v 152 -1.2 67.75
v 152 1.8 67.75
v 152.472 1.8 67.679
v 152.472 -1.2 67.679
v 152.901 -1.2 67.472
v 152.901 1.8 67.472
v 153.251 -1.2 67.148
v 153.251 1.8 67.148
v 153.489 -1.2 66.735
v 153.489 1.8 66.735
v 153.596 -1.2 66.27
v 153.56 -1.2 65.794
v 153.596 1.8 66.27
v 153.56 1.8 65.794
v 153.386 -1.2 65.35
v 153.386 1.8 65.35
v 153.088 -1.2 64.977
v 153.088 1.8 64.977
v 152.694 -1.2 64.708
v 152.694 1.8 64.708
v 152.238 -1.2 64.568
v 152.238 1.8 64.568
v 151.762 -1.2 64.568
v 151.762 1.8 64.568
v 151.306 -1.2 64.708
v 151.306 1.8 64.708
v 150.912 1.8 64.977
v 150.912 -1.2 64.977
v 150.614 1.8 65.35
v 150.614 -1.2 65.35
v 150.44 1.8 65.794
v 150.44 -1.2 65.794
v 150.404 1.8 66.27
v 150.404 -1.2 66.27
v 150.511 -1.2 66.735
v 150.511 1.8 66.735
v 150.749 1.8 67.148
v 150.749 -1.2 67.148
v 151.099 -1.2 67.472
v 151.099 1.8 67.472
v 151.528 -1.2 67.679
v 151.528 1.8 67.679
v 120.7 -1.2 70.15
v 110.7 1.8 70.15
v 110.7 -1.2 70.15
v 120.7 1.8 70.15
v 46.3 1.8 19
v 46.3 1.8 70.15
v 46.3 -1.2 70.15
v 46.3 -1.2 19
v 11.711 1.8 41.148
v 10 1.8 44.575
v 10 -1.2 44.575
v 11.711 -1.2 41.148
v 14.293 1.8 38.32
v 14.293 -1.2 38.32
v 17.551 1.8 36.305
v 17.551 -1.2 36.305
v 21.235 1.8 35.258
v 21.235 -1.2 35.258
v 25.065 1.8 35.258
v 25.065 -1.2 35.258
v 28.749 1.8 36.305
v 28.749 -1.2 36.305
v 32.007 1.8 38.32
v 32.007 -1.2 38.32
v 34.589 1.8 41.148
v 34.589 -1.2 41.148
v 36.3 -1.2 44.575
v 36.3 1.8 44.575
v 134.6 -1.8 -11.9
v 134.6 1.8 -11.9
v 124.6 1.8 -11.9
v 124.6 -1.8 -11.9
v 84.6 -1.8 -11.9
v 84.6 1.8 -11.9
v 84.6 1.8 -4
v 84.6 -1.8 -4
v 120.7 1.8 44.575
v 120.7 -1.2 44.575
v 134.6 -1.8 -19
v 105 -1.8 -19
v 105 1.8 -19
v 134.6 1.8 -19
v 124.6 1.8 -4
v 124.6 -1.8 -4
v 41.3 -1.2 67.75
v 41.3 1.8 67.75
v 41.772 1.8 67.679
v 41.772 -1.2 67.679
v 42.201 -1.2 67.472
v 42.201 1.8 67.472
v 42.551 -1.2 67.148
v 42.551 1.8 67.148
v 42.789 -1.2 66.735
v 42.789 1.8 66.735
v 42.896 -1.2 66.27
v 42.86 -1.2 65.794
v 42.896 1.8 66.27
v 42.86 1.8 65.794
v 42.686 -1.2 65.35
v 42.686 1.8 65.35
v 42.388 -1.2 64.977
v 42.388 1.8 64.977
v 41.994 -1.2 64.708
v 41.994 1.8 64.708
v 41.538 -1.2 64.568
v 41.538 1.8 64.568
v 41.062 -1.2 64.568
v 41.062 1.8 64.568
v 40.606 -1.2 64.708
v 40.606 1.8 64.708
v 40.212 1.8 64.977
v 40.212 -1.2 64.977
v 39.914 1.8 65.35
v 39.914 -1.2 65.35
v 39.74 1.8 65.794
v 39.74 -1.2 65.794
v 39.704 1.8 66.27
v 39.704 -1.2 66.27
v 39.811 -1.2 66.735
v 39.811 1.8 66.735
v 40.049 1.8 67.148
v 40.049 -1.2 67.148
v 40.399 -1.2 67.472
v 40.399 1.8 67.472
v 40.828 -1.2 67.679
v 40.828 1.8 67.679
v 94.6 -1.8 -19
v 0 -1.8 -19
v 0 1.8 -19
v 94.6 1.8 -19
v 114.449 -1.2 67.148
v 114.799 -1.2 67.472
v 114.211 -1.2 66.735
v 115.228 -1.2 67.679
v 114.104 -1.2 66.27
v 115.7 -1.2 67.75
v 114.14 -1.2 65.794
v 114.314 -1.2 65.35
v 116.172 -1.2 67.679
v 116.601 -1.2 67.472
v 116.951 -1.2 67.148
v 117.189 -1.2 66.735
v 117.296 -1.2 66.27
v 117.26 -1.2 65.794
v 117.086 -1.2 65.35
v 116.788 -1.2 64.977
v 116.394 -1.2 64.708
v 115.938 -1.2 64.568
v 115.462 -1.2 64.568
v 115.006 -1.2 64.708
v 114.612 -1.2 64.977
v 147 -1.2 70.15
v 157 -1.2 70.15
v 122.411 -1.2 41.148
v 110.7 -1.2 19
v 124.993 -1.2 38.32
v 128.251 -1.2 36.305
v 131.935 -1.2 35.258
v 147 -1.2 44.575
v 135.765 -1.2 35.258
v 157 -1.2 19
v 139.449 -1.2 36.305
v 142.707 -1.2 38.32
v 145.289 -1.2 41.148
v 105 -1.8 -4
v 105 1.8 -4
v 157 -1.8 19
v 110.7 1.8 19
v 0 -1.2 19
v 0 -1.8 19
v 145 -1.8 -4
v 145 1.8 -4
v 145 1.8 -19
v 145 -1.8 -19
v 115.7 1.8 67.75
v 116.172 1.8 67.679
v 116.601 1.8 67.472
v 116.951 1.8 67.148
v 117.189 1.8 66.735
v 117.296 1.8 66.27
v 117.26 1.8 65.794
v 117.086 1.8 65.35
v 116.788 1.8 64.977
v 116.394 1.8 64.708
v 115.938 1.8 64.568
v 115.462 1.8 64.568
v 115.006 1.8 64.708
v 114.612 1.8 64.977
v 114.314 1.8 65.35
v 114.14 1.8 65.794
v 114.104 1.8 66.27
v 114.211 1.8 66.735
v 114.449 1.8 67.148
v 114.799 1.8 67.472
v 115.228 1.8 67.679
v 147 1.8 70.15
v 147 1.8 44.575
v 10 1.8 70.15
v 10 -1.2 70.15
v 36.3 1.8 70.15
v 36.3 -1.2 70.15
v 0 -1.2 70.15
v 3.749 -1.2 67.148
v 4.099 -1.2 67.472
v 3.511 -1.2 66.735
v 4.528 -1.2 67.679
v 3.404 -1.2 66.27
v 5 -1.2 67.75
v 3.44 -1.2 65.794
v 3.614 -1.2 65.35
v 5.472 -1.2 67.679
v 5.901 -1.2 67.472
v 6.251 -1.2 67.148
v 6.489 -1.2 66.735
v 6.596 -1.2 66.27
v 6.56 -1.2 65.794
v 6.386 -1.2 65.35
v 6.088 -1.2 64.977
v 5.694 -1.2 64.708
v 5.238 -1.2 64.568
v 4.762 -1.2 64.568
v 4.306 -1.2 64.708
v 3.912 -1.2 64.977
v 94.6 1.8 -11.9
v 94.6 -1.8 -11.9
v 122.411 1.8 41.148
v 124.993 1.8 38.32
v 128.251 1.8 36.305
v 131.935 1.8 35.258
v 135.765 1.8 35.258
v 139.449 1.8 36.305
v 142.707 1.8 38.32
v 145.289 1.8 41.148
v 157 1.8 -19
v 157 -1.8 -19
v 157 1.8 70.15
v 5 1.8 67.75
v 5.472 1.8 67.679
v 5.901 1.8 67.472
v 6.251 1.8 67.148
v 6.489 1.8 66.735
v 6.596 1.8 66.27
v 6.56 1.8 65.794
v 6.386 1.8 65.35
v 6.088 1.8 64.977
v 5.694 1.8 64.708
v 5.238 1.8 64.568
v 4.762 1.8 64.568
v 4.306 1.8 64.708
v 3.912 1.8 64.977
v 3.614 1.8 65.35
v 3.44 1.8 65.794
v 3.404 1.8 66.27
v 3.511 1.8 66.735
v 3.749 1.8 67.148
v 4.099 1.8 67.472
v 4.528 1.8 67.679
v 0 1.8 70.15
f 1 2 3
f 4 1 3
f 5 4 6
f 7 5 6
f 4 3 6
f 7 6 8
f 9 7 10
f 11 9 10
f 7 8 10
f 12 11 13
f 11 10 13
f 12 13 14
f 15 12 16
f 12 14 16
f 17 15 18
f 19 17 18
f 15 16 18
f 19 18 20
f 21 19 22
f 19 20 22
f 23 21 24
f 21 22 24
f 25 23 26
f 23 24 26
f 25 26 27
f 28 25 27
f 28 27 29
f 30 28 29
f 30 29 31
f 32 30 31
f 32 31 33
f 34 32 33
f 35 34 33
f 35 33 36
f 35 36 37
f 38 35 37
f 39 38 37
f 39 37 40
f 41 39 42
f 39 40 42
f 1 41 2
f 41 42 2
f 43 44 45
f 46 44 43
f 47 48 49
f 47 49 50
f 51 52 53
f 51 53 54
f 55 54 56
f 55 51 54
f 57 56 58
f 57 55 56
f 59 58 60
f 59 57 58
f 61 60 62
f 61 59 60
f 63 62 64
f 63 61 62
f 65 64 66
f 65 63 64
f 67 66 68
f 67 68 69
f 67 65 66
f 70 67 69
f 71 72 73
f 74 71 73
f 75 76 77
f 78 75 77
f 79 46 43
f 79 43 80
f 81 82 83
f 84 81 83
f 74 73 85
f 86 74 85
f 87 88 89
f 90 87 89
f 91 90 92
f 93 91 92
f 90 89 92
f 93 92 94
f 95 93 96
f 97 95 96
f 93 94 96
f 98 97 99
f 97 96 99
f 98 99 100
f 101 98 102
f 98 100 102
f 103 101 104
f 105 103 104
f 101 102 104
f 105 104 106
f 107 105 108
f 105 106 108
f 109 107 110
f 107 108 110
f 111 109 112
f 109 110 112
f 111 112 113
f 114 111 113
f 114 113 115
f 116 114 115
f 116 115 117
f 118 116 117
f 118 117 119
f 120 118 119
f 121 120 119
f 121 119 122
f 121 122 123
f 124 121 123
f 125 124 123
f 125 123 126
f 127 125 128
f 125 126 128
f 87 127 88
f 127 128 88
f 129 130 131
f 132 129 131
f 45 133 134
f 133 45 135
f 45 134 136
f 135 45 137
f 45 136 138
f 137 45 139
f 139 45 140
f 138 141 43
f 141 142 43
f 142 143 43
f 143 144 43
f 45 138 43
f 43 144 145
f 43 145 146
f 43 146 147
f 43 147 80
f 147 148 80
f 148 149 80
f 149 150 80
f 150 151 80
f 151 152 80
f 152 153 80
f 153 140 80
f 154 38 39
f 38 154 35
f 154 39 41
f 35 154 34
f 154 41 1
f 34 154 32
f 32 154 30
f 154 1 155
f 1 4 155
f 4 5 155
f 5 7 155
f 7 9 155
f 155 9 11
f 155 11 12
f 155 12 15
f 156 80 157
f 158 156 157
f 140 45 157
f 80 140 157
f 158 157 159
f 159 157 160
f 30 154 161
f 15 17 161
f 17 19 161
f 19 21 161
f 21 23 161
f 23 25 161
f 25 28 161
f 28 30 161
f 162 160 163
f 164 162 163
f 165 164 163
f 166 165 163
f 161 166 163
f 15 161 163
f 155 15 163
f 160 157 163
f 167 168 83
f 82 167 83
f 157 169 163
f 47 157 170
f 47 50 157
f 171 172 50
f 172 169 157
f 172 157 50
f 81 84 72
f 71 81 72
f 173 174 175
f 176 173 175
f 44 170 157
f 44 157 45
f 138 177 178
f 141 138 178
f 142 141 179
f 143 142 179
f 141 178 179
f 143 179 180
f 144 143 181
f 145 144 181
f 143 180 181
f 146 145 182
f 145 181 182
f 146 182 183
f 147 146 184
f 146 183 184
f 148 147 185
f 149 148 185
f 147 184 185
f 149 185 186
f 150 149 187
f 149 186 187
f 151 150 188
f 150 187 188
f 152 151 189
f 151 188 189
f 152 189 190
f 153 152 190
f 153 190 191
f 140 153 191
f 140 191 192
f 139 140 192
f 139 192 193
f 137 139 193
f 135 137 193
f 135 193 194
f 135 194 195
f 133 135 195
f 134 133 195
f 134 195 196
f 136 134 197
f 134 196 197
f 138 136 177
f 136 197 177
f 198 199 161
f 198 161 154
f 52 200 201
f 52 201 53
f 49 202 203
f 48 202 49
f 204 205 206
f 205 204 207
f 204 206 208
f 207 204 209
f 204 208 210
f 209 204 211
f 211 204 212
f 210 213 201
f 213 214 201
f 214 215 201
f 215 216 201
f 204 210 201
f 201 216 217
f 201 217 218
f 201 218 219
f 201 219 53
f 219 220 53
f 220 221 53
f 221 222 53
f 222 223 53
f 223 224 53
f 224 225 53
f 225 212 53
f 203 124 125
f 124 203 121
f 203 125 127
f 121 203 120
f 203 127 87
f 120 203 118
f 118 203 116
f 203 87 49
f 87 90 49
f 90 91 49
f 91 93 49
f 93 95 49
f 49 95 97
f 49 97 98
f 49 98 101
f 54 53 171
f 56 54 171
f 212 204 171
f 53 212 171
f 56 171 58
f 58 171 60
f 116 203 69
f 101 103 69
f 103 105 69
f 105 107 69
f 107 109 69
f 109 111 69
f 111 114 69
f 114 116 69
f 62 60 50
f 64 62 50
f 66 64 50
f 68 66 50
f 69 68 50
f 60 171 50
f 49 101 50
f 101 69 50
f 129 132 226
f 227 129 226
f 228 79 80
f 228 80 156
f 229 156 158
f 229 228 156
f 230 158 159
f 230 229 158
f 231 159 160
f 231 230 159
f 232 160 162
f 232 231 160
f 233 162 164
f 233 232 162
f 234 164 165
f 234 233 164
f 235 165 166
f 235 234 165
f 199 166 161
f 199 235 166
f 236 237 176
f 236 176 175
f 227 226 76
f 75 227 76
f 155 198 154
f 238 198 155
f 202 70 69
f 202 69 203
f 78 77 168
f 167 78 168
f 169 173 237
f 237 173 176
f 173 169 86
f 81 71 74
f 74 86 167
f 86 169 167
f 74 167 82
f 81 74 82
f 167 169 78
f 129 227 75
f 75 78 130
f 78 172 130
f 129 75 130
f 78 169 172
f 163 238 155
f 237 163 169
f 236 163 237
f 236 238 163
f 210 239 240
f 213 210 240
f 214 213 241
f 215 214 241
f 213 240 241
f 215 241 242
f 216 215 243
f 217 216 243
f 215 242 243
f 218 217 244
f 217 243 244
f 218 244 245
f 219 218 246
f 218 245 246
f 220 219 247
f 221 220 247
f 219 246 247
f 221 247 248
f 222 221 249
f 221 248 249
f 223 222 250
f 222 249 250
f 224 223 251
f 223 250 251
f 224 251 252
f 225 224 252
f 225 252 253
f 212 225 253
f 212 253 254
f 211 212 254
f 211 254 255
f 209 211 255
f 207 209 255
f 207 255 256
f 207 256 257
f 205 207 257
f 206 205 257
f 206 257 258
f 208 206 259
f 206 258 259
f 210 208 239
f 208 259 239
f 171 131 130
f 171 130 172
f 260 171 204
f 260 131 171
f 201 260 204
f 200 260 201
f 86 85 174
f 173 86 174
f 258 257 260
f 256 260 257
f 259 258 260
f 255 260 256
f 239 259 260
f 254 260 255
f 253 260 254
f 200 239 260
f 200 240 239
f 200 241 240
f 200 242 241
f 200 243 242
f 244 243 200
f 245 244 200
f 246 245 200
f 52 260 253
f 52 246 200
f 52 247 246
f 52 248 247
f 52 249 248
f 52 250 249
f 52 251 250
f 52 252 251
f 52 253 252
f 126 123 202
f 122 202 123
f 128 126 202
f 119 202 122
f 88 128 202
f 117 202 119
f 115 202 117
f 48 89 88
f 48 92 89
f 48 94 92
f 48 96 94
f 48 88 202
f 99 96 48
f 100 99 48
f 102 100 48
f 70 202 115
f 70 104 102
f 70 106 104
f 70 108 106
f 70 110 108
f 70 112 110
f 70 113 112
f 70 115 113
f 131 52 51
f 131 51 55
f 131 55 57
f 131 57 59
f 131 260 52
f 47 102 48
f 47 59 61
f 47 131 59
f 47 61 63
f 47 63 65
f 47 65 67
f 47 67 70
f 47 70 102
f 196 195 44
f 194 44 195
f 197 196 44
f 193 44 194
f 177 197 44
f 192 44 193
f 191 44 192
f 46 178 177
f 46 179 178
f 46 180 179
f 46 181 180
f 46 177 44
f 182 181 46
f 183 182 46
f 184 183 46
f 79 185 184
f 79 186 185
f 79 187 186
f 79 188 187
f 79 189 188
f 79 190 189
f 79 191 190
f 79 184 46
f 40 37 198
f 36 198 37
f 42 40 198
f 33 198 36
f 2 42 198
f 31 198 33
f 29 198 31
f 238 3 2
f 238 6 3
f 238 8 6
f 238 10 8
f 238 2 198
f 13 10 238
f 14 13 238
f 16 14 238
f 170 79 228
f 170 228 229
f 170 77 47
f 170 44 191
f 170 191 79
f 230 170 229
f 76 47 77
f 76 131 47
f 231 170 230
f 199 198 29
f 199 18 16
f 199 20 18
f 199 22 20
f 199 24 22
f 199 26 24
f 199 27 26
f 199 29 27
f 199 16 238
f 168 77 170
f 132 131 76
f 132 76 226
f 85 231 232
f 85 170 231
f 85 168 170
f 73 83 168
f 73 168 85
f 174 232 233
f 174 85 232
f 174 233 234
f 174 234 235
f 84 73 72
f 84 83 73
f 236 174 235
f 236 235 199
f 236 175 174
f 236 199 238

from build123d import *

# Parameters (mm, degrees)
SKETCH_1_W          = 38
SKETCH_1_H          = 3.6
EXTRUDE_1_DEPTH     = 157
SKETCH_2_R          = 1.6
EXTRUDE_2_DEPTH     = 3
CUT_EXTRUDE_1_DEPTH = 172.997042126


with BuildPart() as part:
    # 草图1 → 凸台-拉伸1 (new body)
    with BuildSketch(Plane(origin=(0, 0, 0), x_dir=(0, 0, -1), z_dir=(1, 0, 0))):
        Rectangle(SKETCH_1_W, SKETCH_1_H)
    extrude(amount=EXTRUDE_1_DEPTH)

    # 草图2 → 凸台-拉伸2 (add)
    # profile 1 of 2: a face of its own
    with BuildSketch(Plane(origin=(0, 1.8, 0), x_dir=(1, 0, 0), z_dir=(0, 1, 0))):
        with BuildLine():
            Line((36.3, -19), (10, -19))
            Line((10, -19), (0, -19))
            Line((0, -19), (0, -70.15))
            Line((0, -70.15), (10, -70.15))
            Line((10, -70.15), (10, -49))
            Line((10, -49), (10, -44.575))
            ThreePointArc((10, -44.575), (23.15, -35.125450458), (36.3, -44.575))
            Line((36.3, -44.575), (36.3, -49))
            Line((36.3, -49), (36.3, -70.15))
            Line((36.3, -70.15), (46.3, -70.15))
            Line((46.3, -70.15), (46.3, -19))
            Line((46.3, -19), (36.3, -19))
        make_face()
        with Locations(Location((5, -66.15, 0), (0, 0, 270))):
            Circle(SKETCH_2_R, mode=Mode.SUBTRACT)
        with Locations(Location((41.3, -66.15, 0), (0, 0, 270))):
            Circle(SKETCH_2_R, mode=Mode.SUBTRACT)
    # profile 2 of 2: a face of its own
    with BuildSketch(Plane(origin=(0, 1.8, 0), x_dir=(1, 0, 0), z_dir=(0, 1, 0))):
        with BuildLine():
            Line((120.7, -49), (120.7, -44.575))
            ThreePointArc((120.7, -44.575), (133.85, -35.125450458), (147, -44.575))
            Line((147, -44.575), (147, -49))
            Line((147, -49), (147, -70.15))
            Line((147, -70.15), (157, -70.15))
            Line((157, -70.15), (157, -19))
            Line((157, -19), (147, -19))
            Line((147, -19), (120.7, -19))
            Line((120.7, -19), (110.7, -19))
            Line((110.7, -19), (110.7, -70.15))
            Line((110.7, -70.15), (120.7, -70.15))
            Line((120.7, -70.15), (120.7, -49))
        make_face()
        with Locations(Location((115.7, -66.15, 0), (0, 0, 270))):
            Circle(SKETCH_2_R, mode=Mode.SUBTRACT)
        with Locations(Location((152, -66.15, 0), (0, 0, 270))):
            Circle(SKETCH_2_R, mode=Mode.SUBTRACT)
    extrude(amount=-EXTRUDE_2_DEPTH)

    # 草图4 → 切除-拉伸1 (cut, through all)
    with BuildSketch(Plane(origin=(0, 1.8, 0), x_dir=(1, 0, 0), z_dir=(0, 1, 0))):
        Polygon((105, 19.2), (94.6, 19.2), (94.6, 11.9), (84.6, 11.9), (84.6, 4), (105, 4), align=None)
        Polygon((145, 19.2), (134.6, 19.2), (134.6, 11.9), (124.6, 11.9), (124.6, 4), (145, 4), align=None)
    extrude(amount=-CUT_EXTRUDE_1_DEPTH, mode=Mode.SUBTRACT)


solid = part.part
